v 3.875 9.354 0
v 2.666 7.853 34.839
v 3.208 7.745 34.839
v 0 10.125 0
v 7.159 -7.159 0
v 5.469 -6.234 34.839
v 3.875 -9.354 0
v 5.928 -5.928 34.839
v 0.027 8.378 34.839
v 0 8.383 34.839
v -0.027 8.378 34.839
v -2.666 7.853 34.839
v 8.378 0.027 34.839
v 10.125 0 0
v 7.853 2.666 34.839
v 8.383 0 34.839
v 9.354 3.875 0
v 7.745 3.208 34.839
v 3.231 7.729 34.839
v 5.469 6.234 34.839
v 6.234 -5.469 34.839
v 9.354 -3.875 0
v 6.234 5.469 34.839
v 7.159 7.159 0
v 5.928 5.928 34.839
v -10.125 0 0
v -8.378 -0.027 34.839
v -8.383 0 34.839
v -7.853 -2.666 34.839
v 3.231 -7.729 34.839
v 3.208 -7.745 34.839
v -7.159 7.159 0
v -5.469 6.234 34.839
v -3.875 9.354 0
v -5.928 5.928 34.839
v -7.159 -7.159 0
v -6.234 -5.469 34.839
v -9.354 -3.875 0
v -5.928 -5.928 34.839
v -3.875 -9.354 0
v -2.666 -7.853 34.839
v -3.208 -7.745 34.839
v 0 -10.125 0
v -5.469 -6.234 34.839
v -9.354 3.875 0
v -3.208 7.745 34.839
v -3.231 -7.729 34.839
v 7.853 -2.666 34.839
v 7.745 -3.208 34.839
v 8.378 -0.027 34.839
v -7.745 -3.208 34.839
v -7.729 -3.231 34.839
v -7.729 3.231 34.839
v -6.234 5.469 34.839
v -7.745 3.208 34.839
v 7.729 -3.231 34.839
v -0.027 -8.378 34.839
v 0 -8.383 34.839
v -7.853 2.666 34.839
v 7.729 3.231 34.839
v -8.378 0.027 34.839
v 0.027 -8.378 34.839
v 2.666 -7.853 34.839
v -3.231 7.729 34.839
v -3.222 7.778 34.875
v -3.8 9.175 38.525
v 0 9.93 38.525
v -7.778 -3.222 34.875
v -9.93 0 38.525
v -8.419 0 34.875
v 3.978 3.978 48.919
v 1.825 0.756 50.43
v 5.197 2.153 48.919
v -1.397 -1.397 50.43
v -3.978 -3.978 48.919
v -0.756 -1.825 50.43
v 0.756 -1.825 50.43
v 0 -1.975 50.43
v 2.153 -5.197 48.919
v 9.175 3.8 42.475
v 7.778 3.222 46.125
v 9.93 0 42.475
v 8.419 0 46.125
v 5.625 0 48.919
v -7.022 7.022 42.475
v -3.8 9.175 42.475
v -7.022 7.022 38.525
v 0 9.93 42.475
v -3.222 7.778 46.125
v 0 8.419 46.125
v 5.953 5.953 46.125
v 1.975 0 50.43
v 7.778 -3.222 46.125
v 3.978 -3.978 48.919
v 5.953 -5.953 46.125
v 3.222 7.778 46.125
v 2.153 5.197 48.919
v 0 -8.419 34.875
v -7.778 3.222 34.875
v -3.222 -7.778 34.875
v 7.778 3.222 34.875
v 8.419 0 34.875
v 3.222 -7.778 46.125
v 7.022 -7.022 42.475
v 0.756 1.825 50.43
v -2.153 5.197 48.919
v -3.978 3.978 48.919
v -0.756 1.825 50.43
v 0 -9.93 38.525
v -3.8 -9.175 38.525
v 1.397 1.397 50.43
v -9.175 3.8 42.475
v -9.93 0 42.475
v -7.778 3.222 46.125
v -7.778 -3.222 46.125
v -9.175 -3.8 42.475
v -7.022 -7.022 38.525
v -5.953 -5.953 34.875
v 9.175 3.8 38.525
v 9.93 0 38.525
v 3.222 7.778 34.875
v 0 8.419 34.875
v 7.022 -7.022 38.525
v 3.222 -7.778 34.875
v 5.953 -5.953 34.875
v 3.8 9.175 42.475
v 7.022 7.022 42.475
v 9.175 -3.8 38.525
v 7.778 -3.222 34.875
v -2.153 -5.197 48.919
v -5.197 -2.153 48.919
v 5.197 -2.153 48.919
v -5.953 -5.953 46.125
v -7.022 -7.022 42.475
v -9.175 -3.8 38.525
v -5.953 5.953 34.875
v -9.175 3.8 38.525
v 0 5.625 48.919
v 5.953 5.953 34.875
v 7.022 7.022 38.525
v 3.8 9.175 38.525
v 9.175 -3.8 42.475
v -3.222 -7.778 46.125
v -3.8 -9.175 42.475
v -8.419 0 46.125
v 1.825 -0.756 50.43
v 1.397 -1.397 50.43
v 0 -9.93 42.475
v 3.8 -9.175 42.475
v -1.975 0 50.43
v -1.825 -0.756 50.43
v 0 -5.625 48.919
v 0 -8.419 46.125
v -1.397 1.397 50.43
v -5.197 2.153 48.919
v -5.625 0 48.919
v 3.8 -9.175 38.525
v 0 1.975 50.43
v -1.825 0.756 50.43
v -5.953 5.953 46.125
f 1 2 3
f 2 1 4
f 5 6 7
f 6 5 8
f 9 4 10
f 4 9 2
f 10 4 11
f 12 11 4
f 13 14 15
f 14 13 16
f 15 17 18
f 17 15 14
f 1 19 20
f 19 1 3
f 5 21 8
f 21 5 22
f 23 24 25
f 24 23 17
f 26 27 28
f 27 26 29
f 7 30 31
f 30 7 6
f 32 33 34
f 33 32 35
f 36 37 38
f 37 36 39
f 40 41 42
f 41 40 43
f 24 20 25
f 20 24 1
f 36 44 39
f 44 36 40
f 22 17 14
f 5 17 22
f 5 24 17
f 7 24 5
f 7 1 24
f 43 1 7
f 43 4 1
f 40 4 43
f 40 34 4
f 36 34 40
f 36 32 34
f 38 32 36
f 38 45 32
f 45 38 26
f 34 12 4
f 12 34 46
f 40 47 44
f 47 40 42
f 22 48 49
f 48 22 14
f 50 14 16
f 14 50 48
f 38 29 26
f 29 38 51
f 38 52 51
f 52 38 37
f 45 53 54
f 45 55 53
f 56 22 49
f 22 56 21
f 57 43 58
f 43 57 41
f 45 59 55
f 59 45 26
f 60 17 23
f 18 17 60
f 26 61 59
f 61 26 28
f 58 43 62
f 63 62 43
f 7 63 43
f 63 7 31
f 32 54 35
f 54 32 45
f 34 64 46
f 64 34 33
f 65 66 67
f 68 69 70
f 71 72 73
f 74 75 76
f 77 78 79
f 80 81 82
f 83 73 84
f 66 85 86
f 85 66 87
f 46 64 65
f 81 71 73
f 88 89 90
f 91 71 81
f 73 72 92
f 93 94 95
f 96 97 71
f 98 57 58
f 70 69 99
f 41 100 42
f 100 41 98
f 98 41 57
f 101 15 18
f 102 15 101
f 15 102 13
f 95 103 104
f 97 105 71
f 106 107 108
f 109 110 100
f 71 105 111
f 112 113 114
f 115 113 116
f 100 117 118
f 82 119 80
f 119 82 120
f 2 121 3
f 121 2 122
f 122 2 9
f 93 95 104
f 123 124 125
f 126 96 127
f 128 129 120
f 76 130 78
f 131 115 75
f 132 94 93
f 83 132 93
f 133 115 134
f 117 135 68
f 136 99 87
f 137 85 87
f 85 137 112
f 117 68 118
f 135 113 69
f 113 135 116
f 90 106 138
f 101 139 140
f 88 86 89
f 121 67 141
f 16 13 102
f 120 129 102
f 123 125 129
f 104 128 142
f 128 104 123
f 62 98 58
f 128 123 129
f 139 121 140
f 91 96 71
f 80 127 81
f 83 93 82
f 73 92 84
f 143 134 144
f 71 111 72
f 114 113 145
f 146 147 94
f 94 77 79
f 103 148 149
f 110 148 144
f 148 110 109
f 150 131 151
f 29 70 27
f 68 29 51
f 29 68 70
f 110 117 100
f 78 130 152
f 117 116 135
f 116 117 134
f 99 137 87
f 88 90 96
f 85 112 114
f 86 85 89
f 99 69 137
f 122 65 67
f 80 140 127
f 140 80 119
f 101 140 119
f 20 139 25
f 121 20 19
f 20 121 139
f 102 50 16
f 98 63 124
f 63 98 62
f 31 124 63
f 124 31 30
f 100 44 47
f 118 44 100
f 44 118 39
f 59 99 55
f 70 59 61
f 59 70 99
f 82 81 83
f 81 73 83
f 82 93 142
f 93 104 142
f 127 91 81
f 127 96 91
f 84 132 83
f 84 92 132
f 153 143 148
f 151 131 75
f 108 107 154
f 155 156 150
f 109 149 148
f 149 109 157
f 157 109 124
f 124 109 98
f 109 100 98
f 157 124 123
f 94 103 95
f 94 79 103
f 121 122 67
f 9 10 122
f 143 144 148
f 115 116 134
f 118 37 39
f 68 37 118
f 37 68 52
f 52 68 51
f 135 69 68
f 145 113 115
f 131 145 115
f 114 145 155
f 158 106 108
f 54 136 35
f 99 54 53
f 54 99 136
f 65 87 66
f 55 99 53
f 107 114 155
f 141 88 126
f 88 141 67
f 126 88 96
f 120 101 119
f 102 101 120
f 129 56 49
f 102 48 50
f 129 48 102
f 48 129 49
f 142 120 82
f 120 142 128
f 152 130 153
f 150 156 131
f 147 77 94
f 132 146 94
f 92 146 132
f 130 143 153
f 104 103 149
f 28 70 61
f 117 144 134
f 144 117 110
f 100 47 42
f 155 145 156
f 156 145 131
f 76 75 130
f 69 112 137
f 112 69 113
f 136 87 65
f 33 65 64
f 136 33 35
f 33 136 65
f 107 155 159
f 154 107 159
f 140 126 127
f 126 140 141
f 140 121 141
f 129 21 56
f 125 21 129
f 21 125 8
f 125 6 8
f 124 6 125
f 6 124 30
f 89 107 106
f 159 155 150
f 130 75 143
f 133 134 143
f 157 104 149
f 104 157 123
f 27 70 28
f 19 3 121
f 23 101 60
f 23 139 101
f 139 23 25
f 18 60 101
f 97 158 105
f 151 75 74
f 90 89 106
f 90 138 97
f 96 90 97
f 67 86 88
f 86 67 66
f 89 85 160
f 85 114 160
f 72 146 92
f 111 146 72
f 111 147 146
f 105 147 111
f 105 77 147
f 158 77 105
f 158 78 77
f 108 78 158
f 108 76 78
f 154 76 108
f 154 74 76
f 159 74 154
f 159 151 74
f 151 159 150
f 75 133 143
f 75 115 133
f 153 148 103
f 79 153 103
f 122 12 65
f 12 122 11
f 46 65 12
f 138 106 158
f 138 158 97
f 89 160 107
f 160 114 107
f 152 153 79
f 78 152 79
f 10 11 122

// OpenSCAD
// Customizable Fractal Tree
// 
// By steveweber314
// 
// 5/12/2015

//
// BEGIN CUSTOMIZER

/* [Tree Parameters] */


//depth of recursion (warning: each iteration will take exponentially more time to process)
number_of_iterations = 5; // [1:10]

//starting height of the first branch
height = 45; //[1:100]


//control the amount of taper on each branch segment
width_ratio_bottom = 0.25; //[0.01:0.99]
width_ratio_top = 0.20; //[0.01:0.99]

//size of the "knuckles" between segments
knuckle_size = 0.25; //[0.01:0.99]

//smaller numbers will be more bush-like, larger numbers more tree-like
rate_of_decay = 0.75; //[0.25:1.0]

//number of faces on the cylinders
level_of_smoothness = 16; // [4:100]

//number of faces on the spheres
leaf_smoothness = 16; // [4:100]

//number of faces on the base/stand
base_smoothness = 60; //[20:200]



module trunk(size, depth)
{
    branch_one(size*.9, depth);          
}

module branch_one(size, depth)
{
	color([1,1,0]) 
	{
		//create the branch by tapering a cylinder from one radius to another
		cylinder(h = size, r1 = size*width_ratio_bottom, r2 = size*width_ratio_top);
	}

	//move to the tip of the branch
	translate([0,0,size])
	{
		//check for stop condition
		if (depth > 0) 
		{          
                //create a knuckle
                sphere(size*knuckle_size);
		}
	}
}

//build the tree
trunk(height, 1, $fn=level_of_smoothness);
